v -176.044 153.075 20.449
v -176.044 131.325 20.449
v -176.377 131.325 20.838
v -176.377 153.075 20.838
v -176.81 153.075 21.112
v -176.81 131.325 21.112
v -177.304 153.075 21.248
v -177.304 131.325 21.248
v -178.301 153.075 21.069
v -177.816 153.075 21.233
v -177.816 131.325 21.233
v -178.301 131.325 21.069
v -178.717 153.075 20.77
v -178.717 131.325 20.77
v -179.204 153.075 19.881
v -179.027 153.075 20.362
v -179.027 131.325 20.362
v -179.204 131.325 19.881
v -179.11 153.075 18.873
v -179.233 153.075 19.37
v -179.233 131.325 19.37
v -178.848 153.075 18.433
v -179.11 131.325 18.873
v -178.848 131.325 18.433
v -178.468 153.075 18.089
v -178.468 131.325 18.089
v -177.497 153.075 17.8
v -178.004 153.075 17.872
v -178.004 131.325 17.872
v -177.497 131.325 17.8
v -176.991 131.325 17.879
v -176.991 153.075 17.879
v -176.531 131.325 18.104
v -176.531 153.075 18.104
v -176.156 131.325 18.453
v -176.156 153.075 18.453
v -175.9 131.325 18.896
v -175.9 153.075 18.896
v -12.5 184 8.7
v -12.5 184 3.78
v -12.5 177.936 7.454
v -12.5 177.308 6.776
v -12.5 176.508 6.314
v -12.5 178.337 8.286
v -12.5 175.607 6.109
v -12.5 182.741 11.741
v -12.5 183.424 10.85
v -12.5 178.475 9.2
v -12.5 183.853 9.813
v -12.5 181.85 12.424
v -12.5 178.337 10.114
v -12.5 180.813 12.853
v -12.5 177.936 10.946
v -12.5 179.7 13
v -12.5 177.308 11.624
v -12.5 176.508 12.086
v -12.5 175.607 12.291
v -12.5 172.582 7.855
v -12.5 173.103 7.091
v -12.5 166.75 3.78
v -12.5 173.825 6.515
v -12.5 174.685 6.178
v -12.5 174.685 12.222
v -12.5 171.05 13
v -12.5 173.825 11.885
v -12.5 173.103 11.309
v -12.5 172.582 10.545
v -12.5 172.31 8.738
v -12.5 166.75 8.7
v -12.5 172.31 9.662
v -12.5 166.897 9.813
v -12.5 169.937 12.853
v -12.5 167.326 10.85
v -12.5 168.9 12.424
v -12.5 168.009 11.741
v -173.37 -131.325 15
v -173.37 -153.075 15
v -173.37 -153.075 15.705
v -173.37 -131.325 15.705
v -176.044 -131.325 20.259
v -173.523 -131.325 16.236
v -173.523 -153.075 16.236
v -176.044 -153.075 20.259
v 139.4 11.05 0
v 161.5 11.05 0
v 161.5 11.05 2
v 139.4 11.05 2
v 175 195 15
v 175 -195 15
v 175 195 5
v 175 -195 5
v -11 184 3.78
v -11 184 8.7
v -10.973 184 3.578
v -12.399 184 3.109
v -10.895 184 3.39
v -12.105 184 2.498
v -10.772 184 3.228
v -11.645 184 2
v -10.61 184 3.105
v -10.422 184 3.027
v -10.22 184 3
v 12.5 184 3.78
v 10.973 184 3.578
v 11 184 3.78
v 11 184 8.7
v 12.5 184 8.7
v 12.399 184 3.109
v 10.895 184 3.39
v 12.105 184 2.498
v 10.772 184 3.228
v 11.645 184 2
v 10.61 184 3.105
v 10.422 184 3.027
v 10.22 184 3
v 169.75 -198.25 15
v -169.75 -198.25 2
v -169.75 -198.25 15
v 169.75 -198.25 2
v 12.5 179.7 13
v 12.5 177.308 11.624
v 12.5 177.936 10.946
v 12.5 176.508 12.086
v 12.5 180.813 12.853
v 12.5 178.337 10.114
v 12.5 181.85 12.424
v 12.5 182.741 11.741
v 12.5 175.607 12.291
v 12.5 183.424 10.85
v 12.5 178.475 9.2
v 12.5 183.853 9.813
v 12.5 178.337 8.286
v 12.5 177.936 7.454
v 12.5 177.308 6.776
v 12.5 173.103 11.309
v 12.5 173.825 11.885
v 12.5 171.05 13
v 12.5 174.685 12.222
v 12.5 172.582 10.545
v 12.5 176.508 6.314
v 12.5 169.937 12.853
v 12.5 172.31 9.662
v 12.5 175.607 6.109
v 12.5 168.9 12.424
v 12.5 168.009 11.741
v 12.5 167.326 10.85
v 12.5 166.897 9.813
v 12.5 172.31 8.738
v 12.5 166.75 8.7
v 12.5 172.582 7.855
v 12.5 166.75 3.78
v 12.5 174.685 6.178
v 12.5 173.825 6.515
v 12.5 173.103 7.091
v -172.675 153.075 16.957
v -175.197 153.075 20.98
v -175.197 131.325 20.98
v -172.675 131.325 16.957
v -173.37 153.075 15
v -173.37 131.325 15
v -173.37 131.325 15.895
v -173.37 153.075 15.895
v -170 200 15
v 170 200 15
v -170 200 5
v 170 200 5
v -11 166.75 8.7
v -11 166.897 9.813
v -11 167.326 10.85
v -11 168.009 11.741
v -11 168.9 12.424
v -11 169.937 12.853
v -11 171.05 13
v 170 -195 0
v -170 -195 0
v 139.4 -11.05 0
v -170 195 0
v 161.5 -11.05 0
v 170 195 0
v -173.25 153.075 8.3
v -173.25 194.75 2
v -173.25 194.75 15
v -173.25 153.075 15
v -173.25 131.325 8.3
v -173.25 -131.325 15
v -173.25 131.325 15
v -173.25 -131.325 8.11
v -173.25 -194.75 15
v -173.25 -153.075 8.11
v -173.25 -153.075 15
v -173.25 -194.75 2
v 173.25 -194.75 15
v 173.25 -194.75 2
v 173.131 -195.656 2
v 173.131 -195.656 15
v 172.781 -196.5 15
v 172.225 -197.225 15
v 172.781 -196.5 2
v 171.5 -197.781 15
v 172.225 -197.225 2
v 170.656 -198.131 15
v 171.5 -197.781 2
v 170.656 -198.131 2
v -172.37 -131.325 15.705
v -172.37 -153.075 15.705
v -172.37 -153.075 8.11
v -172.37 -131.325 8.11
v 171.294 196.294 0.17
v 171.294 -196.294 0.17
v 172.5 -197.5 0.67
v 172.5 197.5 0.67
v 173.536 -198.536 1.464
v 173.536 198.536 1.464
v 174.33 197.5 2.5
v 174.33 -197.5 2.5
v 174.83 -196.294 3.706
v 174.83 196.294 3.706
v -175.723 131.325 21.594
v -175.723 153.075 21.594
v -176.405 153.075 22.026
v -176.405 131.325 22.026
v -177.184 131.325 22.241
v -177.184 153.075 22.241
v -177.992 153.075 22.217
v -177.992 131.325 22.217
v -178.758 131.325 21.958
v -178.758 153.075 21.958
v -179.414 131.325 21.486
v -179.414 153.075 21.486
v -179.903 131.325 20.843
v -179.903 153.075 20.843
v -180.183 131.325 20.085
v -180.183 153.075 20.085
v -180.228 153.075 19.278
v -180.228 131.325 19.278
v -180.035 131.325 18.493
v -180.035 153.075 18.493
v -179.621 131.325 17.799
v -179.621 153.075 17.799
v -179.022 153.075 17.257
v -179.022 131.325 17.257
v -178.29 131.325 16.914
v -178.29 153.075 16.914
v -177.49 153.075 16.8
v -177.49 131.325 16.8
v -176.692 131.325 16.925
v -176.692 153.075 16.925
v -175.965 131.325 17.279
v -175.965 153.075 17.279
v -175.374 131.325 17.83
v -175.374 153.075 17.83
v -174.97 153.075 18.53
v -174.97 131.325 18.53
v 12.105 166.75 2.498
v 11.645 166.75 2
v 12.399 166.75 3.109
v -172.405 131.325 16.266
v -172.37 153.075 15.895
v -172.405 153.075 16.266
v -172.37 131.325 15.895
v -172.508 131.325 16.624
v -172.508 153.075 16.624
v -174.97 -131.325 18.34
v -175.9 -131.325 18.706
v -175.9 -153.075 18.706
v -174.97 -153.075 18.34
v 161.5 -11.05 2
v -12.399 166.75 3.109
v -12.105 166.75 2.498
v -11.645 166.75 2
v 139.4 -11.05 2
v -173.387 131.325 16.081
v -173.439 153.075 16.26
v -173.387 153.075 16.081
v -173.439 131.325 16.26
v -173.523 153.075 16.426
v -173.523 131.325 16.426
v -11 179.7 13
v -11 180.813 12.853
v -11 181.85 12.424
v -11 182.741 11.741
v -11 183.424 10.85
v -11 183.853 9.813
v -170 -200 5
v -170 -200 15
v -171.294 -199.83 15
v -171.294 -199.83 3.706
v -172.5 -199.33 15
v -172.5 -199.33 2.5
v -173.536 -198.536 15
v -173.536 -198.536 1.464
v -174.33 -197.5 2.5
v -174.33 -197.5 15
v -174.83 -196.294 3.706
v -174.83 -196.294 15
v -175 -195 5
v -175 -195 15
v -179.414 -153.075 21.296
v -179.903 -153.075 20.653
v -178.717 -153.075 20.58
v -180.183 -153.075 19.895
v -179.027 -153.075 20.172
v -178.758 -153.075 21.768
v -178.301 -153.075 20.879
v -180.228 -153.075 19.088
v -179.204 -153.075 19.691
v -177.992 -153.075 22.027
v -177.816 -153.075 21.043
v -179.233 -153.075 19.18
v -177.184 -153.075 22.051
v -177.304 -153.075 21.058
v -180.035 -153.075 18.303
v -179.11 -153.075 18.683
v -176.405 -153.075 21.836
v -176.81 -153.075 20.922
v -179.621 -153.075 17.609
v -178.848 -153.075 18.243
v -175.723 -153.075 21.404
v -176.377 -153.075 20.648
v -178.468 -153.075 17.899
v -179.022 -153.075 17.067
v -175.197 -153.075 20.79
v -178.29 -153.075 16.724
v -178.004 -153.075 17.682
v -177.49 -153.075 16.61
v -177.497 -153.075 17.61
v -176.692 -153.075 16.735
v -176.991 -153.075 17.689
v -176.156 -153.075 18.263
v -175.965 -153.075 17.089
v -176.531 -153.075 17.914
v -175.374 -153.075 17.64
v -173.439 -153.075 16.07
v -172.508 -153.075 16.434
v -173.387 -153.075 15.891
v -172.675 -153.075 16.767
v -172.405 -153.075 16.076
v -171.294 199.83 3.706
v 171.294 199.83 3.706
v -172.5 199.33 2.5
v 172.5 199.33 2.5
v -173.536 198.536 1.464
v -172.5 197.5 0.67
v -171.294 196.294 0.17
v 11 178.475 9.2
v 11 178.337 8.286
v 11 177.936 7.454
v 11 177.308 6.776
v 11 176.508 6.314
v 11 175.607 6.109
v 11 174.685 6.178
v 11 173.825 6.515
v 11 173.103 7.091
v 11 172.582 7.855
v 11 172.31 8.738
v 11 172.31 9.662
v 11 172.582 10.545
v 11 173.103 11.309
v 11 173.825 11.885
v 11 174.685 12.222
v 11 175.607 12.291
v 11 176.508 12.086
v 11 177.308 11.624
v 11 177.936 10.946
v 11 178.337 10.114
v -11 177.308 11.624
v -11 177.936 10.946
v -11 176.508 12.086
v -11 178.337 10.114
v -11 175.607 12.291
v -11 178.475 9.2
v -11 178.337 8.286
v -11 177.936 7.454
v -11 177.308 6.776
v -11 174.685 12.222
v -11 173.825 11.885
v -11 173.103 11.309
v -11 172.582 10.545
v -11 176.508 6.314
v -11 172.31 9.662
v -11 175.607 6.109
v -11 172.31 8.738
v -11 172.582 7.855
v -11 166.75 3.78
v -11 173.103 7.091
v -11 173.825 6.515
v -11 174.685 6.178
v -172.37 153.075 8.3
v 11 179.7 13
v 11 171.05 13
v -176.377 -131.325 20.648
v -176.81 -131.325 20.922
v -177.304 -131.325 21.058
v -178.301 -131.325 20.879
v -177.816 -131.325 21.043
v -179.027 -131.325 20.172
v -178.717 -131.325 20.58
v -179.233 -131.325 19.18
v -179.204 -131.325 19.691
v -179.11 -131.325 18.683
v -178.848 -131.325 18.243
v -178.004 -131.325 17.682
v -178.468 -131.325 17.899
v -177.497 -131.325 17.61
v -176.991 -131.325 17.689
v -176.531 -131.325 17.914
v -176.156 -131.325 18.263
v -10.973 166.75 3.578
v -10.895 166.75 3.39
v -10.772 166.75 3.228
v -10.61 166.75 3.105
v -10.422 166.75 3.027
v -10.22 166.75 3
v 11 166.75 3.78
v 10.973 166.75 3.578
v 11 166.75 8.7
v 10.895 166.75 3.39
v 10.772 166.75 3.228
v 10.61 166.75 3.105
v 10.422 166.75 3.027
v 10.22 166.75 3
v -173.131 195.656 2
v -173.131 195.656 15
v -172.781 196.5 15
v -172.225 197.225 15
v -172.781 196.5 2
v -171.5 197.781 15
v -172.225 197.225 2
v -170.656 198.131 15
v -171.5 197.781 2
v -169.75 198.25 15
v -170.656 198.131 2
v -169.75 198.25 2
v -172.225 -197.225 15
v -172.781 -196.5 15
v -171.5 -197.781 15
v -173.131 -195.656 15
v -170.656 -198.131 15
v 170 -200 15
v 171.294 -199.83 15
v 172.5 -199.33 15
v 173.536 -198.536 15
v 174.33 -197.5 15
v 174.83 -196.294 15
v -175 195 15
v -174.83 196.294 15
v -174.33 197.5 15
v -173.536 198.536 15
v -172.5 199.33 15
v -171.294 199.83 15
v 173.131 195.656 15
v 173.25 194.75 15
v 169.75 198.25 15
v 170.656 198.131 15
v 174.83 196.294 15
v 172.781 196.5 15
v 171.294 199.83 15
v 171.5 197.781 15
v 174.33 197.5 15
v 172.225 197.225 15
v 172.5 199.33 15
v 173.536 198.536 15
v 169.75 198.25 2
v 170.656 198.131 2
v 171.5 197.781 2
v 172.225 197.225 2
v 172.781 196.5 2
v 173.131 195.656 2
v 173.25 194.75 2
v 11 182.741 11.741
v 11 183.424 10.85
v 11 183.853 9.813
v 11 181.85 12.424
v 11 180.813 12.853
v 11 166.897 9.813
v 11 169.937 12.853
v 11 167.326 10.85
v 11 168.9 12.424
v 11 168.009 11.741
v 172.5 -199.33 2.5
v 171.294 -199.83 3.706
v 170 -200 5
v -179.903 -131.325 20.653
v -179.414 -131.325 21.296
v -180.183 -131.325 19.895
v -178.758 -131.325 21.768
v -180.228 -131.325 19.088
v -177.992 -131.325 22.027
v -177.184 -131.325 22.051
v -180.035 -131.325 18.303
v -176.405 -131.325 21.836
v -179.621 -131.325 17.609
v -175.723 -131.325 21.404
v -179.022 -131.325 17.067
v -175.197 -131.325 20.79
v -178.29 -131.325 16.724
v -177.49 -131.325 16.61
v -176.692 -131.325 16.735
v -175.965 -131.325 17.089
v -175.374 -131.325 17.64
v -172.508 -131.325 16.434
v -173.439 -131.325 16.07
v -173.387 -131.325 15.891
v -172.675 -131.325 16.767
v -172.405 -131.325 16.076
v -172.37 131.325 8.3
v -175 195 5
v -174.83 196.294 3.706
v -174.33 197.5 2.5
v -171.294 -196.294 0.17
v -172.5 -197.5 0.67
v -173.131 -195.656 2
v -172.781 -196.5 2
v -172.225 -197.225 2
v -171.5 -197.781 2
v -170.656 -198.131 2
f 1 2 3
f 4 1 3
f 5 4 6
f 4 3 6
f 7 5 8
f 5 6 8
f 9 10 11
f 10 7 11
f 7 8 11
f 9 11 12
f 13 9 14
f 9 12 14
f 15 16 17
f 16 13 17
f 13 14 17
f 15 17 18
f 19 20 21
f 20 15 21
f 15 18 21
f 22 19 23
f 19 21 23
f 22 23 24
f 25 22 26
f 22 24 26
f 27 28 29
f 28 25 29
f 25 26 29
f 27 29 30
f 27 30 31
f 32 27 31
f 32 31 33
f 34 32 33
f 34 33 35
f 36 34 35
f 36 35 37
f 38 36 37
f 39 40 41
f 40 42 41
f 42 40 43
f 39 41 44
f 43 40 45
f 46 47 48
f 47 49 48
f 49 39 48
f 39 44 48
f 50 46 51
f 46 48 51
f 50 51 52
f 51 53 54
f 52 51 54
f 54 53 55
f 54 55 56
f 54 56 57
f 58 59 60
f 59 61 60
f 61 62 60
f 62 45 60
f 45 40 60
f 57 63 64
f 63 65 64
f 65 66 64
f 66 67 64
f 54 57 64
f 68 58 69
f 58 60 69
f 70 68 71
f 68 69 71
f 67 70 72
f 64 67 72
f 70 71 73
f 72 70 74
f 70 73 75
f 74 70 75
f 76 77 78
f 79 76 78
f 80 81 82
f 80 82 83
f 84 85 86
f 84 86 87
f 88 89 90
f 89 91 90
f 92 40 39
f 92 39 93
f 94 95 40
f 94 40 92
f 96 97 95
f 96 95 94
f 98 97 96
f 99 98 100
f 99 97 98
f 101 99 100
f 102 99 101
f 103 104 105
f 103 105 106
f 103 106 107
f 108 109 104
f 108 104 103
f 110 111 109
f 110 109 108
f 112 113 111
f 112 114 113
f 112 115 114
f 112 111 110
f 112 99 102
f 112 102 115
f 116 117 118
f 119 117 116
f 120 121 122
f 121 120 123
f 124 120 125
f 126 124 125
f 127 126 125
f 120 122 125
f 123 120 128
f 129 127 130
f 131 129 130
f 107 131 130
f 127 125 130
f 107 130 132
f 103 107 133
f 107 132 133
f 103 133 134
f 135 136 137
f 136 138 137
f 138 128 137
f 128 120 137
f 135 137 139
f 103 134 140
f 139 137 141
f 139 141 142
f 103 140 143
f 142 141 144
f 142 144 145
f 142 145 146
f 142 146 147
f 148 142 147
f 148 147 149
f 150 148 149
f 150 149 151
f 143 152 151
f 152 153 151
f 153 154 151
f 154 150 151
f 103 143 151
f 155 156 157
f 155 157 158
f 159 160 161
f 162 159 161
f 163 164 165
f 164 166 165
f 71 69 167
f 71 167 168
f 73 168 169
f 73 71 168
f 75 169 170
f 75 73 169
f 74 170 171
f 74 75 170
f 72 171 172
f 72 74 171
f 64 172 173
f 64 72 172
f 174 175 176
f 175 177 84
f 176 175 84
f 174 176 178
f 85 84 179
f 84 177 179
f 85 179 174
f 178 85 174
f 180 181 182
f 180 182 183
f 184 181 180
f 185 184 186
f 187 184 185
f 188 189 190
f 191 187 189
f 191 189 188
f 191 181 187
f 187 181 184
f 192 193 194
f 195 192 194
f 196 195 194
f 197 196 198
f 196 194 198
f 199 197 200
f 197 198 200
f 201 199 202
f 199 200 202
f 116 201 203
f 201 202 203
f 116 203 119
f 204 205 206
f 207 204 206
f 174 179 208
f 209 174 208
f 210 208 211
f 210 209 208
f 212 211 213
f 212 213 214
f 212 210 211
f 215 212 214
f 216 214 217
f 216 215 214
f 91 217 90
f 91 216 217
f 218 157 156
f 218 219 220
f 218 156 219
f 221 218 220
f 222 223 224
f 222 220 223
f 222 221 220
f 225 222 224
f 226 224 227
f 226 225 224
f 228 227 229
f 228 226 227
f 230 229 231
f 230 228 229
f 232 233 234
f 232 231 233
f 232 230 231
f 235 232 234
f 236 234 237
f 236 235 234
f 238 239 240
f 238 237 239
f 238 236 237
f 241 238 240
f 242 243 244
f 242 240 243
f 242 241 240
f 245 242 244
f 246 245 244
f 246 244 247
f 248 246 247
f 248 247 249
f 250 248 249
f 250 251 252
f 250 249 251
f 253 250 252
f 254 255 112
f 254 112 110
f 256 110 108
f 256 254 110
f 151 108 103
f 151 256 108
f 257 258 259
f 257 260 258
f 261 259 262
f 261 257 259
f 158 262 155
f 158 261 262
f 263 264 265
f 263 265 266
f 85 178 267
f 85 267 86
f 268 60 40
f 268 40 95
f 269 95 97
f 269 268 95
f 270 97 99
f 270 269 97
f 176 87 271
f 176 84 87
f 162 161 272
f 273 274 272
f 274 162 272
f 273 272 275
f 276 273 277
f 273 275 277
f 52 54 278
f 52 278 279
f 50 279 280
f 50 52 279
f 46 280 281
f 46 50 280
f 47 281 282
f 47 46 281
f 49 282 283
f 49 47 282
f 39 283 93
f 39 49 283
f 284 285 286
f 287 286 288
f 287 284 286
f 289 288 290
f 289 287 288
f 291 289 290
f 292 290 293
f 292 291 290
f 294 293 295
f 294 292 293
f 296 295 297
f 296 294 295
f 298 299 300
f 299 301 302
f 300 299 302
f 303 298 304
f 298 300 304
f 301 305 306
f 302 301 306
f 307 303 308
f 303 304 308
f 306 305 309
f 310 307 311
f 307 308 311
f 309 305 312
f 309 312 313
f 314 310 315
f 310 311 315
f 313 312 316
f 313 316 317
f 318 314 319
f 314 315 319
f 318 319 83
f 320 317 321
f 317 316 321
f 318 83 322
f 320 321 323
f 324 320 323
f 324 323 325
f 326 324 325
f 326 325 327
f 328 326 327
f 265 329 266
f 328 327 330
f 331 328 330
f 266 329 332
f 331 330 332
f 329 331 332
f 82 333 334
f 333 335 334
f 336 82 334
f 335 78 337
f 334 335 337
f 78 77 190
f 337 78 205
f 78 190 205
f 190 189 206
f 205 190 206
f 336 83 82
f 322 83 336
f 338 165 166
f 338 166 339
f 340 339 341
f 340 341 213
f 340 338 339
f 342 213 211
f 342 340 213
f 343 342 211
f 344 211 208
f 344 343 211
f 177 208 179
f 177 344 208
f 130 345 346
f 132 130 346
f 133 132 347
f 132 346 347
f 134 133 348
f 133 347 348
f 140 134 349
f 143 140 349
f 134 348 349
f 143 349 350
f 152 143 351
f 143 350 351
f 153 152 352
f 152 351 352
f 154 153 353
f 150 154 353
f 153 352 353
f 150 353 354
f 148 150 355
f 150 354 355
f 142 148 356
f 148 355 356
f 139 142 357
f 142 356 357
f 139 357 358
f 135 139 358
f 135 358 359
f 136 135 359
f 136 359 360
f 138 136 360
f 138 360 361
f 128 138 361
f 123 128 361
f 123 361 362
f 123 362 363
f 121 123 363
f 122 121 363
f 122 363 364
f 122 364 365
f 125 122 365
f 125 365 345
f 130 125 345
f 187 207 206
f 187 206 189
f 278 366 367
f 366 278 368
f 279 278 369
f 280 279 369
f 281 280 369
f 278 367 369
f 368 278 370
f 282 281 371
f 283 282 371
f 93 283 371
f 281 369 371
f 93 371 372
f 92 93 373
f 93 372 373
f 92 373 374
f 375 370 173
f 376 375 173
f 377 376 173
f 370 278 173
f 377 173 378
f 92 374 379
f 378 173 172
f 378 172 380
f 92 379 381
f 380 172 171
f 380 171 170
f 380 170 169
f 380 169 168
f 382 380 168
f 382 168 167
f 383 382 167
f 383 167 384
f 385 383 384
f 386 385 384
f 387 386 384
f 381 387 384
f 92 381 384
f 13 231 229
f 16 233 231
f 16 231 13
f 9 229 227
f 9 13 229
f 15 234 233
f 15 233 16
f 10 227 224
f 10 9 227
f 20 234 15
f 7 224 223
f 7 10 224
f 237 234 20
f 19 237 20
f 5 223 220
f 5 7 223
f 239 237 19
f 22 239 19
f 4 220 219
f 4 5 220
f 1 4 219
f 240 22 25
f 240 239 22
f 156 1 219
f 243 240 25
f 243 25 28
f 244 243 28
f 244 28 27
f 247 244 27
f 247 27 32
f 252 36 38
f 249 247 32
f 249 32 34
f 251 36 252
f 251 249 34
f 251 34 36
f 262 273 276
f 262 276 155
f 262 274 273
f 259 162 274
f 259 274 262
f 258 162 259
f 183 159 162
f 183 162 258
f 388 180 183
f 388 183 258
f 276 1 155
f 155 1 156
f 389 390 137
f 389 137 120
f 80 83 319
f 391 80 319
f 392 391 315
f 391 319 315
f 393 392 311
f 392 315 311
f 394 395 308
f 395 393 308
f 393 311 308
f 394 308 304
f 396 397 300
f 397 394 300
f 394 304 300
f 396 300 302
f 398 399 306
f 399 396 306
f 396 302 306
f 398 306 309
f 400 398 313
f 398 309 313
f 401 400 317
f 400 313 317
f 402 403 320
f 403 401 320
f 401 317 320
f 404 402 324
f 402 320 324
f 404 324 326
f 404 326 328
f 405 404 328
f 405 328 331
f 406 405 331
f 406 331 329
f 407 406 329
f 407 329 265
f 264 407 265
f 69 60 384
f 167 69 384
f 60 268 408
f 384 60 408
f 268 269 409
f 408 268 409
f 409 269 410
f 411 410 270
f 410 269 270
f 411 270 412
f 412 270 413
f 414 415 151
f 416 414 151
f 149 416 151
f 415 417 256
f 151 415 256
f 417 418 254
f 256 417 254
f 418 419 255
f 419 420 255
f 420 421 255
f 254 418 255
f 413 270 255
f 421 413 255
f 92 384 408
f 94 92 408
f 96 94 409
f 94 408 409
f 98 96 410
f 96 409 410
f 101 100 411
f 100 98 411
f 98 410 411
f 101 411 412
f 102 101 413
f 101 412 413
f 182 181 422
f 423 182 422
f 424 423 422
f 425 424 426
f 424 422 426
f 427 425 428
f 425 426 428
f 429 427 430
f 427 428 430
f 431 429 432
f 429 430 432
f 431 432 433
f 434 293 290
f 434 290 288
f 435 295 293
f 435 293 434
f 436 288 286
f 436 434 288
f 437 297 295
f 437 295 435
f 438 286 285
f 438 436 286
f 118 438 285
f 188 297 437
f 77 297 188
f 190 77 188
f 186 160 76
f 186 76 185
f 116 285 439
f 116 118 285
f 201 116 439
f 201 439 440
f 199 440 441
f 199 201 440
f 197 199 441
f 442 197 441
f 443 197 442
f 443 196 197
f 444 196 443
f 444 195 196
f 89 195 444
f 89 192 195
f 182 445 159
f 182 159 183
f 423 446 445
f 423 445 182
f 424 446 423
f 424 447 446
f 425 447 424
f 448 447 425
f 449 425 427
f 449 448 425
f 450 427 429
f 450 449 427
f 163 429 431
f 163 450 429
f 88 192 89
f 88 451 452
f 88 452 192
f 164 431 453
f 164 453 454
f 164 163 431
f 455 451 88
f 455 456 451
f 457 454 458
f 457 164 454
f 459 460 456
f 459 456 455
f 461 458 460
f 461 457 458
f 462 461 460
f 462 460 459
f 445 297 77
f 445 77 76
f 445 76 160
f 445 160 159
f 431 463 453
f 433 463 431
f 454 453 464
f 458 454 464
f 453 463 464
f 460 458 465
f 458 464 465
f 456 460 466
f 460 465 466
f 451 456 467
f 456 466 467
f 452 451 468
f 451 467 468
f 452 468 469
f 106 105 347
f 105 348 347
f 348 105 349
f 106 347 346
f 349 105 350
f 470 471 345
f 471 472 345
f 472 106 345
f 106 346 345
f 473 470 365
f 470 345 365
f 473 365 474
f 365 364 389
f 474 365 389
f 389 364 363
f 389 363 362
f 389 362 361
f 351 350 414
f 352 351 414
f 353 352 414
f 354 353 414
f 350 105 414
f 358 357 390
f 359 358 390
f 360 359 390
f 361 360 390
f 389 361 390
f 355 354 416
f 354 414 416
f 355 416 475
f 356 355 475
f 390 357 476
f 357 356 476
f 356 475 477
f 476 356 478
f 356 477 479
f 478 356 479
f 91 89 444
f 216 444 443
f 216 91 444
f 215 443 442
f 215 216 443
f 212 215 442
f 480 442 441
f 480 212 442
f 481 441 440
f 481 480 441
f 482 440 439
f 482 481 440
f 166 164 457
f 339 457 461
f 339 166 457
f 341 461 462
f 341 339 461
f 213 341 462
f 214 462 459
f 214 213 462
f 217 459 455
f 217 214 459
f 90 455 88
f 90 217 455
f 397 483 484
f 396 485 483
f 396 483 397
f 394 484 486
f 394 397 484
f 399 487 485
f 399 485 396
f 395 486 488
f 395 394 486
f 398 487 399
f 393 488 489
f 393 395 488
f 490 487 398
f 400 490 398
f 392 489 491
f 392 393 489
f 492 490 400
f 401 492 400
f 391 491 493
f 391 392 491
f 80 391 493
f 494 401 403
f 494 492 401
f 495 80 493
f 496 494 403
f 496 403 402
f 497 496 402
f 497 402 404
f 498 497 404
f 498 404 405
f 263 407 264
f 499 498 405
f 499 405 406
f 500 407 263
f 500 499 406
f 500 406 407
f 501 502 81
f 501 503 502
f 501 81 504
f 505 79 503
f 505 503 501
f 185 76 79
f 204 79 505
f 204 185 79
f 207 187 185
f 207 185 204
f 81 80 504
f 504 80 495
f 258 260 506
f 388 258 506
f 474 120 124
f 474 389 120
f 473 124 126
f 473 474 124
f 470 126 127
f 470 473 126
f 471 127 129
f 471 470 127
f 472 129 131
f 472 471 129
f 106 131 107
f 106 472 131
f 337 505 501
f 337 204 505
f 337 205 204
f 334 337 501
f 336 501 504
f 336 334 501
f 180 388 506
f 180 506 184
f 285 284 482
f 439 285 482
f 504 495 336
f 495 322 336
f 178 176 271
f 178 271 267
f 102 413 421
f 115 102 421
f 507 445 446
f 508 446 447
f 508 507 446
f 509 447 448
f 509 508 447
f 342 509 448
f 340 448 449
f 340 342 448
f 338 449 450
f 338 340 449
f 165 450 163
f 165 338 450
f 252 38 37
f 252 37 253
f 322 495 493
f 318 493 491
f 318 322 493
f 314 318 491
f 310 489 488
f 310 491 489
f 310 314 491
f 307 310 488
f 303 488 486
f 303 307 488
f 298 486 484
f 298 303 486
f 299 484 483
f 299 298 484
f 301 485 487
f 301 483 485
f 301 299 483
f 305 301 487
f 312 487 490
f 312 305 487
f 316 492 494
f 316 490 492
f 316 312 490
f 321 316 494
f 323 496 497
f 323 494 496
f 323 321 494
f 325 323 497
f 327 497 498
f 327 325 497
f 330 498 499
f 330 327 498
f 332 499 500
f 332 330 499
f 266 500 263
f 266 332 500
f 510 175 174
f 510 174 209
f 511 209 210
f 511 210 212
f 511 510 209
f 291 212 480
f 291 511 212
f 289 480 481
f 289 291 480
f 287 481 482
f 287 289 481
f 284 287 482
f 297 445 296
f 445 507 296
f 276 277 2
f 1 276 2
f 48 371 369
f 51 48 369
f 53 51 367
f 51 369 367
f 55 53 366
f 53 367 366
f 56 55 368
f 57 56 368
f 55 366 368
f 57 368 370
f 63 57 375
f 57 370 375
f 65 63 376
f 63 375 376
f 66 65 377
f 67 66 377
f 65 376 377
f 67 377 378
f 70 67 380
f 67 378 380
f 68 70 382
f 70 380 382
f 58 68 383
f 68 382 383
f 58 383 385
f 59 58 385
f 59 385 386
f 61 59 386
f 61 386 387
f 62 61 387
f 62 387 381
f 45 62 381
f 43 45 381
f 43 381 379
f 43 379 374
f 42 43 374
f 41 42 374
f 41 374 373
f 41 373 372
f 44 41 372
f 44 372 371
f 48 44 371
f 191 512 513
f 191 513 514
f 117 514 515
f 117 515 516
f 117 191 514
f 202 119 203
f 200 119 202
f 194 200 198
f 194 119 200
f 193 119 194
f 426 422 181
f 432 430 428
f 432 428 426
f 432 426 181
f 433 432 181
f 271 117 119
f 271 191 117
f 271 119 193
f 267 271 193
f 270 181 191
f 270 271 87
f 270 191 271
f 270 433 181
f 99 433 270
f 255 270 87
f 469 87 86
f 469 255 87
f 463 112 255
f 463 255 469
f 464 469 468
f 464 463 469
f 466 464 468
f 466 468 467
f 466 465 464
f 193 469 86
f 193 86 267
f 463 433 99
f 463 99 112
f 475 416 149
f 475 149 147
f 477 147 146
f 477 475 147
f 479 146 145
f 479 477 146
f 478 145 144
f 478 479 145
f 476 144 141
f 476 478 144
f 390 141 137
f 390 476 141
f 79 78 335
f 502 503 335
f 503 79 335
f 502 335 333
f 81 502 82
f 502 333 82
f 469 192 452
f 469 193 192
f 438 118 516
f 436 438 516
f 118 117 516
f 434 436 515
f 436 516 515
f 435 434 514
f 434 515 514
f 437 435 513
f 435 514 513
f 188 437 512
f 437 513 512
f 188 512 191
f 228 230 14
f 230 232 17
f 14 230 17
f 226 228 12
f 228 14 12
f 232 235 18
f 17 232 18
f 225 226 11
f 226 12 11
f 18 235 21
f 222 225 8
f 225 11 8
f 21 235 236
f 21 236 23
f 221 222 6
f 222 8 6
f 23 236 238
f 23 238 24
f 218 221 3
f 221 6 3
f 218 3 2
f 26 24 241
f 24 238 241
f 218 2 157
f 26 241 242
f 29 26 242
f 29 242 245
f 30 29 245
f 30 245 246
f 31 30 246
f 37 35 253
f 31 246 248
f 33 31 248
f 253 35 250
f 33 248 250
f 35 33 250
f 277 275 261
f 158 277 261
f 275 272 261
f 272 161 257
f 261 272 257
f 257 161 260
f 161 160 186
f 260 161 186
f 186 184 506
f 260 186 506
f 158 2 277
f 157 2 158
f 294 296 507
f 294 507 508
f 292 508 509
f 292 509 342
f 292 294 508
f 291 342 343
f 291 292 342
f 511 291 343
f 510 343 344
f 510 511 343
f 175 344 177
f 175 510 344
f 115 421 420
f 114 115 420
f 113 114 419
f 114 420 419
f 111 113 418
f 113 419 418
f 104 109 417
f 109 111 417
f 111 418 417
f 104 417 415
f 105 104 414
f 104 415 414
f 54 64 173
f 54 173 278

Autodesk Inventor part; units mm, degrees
sketch "Sketch_2" plane through (0, 0, 0) normal (0, 0, 1) x (1, 0, 0)
  arc A0 (-175, -195) -> (-170, -200) centre (-170, -195) ccw
  line L0 (-170, -200) -> (170, -200)
  arc A1 (170, -200) -> (175, -195) centre (170, -195) ccw
  line L1 (175, -195) -> (175, 195)
  arc A2 (175, 195) -> (170, 200) centre (170, 195) ccw
  line L2 (170, 200) -> (-170, 200)
  arc A3 (-170, 200) -> (-175, 195) centre (-170, 195) ccw
  line L3 (-175, 195) -> (-175, -195)
extrude "Extrusion1" add sketch "Sketch_2" along normal blind 15
sketch "Sketch_3" plane through (0, 0, 0) normal (0, 1, 0) x (-1, 0, 0)
  line L0 (350, -15) -> (350, 30)
  line L1 (350, 30) -> (-350, 30)
  line L2 (-350, 30) -> (-350, -15)
  line L3 (-350, -15) -> (350, -15)
  line L4 (175, 5) -> (175, 15)
  line L5 (175, 15) -> (-175, 15)
  line L6 (-175, 15) -> (-175, 5)
  arc A0 (-175, 5) -> (-170, 0) centre (-170, 5) ccw
  line L7 (-170, 0) -> (170, 0)
  arc A1 (170, 0) -> (175, 5) centre (170, 5) ccw
extrude "Extrusion2" cut sketch "Sketch_3" along normal mid plane 400
sketch "Sketch_4" plane through (0, 0, 0) normal (1, 0, 0) x (0, 1, 0)
  line L0 (400, 30) -> (-400, 30)
  line L1 (-400, 30) -> (-400, -15)
  line L2 (-400, -15) -> (400, -15)
  line L3 (400, -15) -> (400, 30)
  line L4 (200, 15) -> (-200, 15)
  line L5 (-200, 15) -> (-200, 5)
  arc A0 (-200, 5) -> (-195, 0) centre (-195, 5) ccw
  line L6 (-195, 0) -> (195, 0)
  arc A1 (195, 0) -> (200, 5) centre (195, 5) ccw
  line L7 (200, 5) -> (200, 15)
extrude "Extrusion3" cut sketch "Sketch_4" along normal mid plane 350
sketch "Sketch_8" plane through (0, 0, 2) normal (0, 0, 1) x (1, 0, 0)
  arc A0 (-173.25, -194.75) -> (-169.75, -198.25) centre (-169.75, -194.75) ccw
  line L0 (-169.75, -198.25) -> (169.75, -198.25)
  arc A1 (169.75, -198.25) -> (173.25, -194.75) centre (169.75, -194.75) ccw
  line L1 (173.25, -194.75) -> (173.25, 194.75)
  arc A2 (173.25, 194.75) -> (169.75, 198.25) centre (169.75, 194.75) ccw
  line L2 (169.75, 198.25) -> (-169.75, 198.25)
  arc A3 (-169.75, 198.25) -> (-173.25, 194.75) centre (-169.75, 194.75) ccw
  line L3 (-173.25, 194.75) -> (-173.25, -194.75)
extrude "Extrusion4" cut sketch "Sketch_8" along normal blind 15.5
sketch "Sketch_6" plane through (0, 0, 0) normal (0, 0, 1) x (1, 0, 0)
  line L0 (139.4, 11.05) -> (139.4, -11.05)
  line L1 (139.4, -11.05) -> (161.5, -11.05)
  line L2 (161.5, -11.05) -> (161.5, 11.05)
  line L3 (161.5, 11.05) -> (139.4, 11.05)
extrude "Extrusion5" cut sketch "Sketch_6" along normal blind 3
sketch "Sketch_9" plane through (0, 166.75, 0) normal (0, 1, 0) x (1, 0, 0)
  line L0 (-12.5, -3.78) -> (-12.5, -14.5)
  line L1 (-12.5, -14.5) -> (-11, -14.5)
  line L2 (-11, -14.5) -> (-11, -3.78)
  arc A0 (-10.22, -3) -> (-11, -3.78) centre (-10.22, -3.78) ccw
  line L3 (-10.22, -3) -> (10.22, -3)
  arc A1 (11, -3.78) -> (10.22, -3) centre (10.22, -3.78) ccw
  line L4 (11, -3.78) -> (11, -14.5)
  line L5 (11, -14.5) -> (12.5, -14.5)
  line L6 (12.5, -14.5) -> (12.5, -3.78)
  arc A2 (12.5, -3.78) -> (10.22, -1.5) centre (10.22, -3.78) ccw
  line L7 (10.22, -1.5) -> (-10.22, -1.5)
  arc A3 (-10.22, -1.5) -> (-12.5, -3.78) centre (-10.22, -3.78) ccw
extrude "Extrusion6" add sketch "Sketch_9" along normal blind 17.25
sketch "Sketch_10" plane through (0, 0, 0) normal (1, 0, 0) x (0, 1, 0)
  line L0 (188.375, 20.7) -> (162.375, 20.7)
  line L1 (162.375, 20.7) -> (162.375, 8.7)
  line L2 (162.375, 8.7) -> (166.75, 8.7)
  arc A0 (171.05, 13) -> (166.75, 8.7) centre (171.05, 8.7) ccw
  line L3 (171.05, 13) -> (179.7, 13)
  arc A1 (184, 8.7) -> (179.7, 13) centre (179.7, 8.7) ccw
  line L4 (184, 8.7) -> (188.375, 8.7)
  line L5 (188.375, 8.7) -> (188.375, 20.7)
extrude "Extrusion7" cut sketch "Sketch_10" along normal mid plane 30
sketch "Sketch_11" plane through (0, 0, 0) normal (1, 0, 0) x (0, 1, 0)
  circle A0 centre (175.375, 9.2) radius 3.1
extrude "Extrusion8" cut sketch "Sketch_11" along normal mid plane 30
sketch "Sketch_12" plane through (0, 142.2, 0) normal (0, 1, 0) x (1, 0, 0)
  arc A0 (-174.9697, -18.53) -> (-175.1968, -20.9799) centre (-177.51, -19.53) ccw
  line L0 (-175.1968, -20.9799) -> (-172.6754, -16.9572)
  arc A1 (-172.6754, -16.9572) -> (-172.37, -15.895) centre (-174.37, -15.895) ccw
  line L1 (-172.37, -15.895) -> (-172.37, -8.3)
  line L2 (-172.37, -8.3) -> (-173.37, -8.3)
  line L3 (-173.37, -8.3) -> (-173.37, -15.895)
  arc A2 (-173.5227, -16.4261) -> (-173.37, -15.895) centre (-174.37, -15.895) ccw
  line L4 (-173.5227, -16.4261) -> (-176.0442, -20.4488)
  arc A3 (-175.9002, -18.8963) -> (-176.0442, -20.4488) centre (-177.51, -19.53) ccw
  line L5 (-175.9002, -18.8963) -> (-174.9697, -18.53)
extrude "Extrusion9" add sketch "Sketch_12" along normal mid plane 21.75
sketch "Sketch_7" plane through (0, -142.2, 0) normal (0, 1, 0) x (1, 0, 0)
  arc A0 (-174.9697, -18.34) -> (-175.1968, -20.7899) centre (-177.51, -19.34) ccw
  line L0 (-175.1968, -20.7899) -> (-172.6754, -16.7672)
  arc A1 (-172.6754, -16.7672) -> (-172.37, -15.705) centre (-174.37, -15.705) ccw
  line L1 (-172.37, -15.705) -> (-172.37, -8.11)
  line L2 (-172.37, -8.11) -> (-173.37, -8.11)
  line L3 (-173.37, -8.11) -> (-173.37, -15.705)
  arc A2 (-173.5227, -16.2361) -> (-173.37, -15.705) centre (-174.37, -15.705) ccw
  line L4 (-173.5227, -16.2361) -> (-176.0442, -20.2588)
  arc A3 (-175.9002, -18.7063) -> (-176.0442, -20.2588) centre (-177.51, -19.34) ccw
  line L5 (-175.9002, -18.7063) -> (-174.9697, -18.34)
extrude "Extrusion10" add sketch "Sketch_7" along normal mid plane 21.75
ref_plane "door_to_hinge_XY" through (-177.51, 142.2, 19.53) normal (0, 1, 0) x (1, 0, 0)
ref_plane "door_to_hinge_YZ" through (-177.51, 142.2, 19.53) normal (1, 0, 0) x (0, 0, -1)
ref_plane "door_to_hinge_ZX" through (-177.51, 142.2, 19.53) normal (0, 0, -1) x (0, 1, 0)
ref_plane "lock_XY" through (152.45, 0, -7) normal (0, 0, 1) x (1, 0, 0)
ref_plane "lock_YZ" through (152.45, 0, -7) normal (1, 0, 0) x (0, 1, 0)
ref_plane "lock_ZX" through (152.45, 0, -7) normal (0, 1, 0) x (0, 0, 1)
properties part number "jJBDOOR161410HC1"
